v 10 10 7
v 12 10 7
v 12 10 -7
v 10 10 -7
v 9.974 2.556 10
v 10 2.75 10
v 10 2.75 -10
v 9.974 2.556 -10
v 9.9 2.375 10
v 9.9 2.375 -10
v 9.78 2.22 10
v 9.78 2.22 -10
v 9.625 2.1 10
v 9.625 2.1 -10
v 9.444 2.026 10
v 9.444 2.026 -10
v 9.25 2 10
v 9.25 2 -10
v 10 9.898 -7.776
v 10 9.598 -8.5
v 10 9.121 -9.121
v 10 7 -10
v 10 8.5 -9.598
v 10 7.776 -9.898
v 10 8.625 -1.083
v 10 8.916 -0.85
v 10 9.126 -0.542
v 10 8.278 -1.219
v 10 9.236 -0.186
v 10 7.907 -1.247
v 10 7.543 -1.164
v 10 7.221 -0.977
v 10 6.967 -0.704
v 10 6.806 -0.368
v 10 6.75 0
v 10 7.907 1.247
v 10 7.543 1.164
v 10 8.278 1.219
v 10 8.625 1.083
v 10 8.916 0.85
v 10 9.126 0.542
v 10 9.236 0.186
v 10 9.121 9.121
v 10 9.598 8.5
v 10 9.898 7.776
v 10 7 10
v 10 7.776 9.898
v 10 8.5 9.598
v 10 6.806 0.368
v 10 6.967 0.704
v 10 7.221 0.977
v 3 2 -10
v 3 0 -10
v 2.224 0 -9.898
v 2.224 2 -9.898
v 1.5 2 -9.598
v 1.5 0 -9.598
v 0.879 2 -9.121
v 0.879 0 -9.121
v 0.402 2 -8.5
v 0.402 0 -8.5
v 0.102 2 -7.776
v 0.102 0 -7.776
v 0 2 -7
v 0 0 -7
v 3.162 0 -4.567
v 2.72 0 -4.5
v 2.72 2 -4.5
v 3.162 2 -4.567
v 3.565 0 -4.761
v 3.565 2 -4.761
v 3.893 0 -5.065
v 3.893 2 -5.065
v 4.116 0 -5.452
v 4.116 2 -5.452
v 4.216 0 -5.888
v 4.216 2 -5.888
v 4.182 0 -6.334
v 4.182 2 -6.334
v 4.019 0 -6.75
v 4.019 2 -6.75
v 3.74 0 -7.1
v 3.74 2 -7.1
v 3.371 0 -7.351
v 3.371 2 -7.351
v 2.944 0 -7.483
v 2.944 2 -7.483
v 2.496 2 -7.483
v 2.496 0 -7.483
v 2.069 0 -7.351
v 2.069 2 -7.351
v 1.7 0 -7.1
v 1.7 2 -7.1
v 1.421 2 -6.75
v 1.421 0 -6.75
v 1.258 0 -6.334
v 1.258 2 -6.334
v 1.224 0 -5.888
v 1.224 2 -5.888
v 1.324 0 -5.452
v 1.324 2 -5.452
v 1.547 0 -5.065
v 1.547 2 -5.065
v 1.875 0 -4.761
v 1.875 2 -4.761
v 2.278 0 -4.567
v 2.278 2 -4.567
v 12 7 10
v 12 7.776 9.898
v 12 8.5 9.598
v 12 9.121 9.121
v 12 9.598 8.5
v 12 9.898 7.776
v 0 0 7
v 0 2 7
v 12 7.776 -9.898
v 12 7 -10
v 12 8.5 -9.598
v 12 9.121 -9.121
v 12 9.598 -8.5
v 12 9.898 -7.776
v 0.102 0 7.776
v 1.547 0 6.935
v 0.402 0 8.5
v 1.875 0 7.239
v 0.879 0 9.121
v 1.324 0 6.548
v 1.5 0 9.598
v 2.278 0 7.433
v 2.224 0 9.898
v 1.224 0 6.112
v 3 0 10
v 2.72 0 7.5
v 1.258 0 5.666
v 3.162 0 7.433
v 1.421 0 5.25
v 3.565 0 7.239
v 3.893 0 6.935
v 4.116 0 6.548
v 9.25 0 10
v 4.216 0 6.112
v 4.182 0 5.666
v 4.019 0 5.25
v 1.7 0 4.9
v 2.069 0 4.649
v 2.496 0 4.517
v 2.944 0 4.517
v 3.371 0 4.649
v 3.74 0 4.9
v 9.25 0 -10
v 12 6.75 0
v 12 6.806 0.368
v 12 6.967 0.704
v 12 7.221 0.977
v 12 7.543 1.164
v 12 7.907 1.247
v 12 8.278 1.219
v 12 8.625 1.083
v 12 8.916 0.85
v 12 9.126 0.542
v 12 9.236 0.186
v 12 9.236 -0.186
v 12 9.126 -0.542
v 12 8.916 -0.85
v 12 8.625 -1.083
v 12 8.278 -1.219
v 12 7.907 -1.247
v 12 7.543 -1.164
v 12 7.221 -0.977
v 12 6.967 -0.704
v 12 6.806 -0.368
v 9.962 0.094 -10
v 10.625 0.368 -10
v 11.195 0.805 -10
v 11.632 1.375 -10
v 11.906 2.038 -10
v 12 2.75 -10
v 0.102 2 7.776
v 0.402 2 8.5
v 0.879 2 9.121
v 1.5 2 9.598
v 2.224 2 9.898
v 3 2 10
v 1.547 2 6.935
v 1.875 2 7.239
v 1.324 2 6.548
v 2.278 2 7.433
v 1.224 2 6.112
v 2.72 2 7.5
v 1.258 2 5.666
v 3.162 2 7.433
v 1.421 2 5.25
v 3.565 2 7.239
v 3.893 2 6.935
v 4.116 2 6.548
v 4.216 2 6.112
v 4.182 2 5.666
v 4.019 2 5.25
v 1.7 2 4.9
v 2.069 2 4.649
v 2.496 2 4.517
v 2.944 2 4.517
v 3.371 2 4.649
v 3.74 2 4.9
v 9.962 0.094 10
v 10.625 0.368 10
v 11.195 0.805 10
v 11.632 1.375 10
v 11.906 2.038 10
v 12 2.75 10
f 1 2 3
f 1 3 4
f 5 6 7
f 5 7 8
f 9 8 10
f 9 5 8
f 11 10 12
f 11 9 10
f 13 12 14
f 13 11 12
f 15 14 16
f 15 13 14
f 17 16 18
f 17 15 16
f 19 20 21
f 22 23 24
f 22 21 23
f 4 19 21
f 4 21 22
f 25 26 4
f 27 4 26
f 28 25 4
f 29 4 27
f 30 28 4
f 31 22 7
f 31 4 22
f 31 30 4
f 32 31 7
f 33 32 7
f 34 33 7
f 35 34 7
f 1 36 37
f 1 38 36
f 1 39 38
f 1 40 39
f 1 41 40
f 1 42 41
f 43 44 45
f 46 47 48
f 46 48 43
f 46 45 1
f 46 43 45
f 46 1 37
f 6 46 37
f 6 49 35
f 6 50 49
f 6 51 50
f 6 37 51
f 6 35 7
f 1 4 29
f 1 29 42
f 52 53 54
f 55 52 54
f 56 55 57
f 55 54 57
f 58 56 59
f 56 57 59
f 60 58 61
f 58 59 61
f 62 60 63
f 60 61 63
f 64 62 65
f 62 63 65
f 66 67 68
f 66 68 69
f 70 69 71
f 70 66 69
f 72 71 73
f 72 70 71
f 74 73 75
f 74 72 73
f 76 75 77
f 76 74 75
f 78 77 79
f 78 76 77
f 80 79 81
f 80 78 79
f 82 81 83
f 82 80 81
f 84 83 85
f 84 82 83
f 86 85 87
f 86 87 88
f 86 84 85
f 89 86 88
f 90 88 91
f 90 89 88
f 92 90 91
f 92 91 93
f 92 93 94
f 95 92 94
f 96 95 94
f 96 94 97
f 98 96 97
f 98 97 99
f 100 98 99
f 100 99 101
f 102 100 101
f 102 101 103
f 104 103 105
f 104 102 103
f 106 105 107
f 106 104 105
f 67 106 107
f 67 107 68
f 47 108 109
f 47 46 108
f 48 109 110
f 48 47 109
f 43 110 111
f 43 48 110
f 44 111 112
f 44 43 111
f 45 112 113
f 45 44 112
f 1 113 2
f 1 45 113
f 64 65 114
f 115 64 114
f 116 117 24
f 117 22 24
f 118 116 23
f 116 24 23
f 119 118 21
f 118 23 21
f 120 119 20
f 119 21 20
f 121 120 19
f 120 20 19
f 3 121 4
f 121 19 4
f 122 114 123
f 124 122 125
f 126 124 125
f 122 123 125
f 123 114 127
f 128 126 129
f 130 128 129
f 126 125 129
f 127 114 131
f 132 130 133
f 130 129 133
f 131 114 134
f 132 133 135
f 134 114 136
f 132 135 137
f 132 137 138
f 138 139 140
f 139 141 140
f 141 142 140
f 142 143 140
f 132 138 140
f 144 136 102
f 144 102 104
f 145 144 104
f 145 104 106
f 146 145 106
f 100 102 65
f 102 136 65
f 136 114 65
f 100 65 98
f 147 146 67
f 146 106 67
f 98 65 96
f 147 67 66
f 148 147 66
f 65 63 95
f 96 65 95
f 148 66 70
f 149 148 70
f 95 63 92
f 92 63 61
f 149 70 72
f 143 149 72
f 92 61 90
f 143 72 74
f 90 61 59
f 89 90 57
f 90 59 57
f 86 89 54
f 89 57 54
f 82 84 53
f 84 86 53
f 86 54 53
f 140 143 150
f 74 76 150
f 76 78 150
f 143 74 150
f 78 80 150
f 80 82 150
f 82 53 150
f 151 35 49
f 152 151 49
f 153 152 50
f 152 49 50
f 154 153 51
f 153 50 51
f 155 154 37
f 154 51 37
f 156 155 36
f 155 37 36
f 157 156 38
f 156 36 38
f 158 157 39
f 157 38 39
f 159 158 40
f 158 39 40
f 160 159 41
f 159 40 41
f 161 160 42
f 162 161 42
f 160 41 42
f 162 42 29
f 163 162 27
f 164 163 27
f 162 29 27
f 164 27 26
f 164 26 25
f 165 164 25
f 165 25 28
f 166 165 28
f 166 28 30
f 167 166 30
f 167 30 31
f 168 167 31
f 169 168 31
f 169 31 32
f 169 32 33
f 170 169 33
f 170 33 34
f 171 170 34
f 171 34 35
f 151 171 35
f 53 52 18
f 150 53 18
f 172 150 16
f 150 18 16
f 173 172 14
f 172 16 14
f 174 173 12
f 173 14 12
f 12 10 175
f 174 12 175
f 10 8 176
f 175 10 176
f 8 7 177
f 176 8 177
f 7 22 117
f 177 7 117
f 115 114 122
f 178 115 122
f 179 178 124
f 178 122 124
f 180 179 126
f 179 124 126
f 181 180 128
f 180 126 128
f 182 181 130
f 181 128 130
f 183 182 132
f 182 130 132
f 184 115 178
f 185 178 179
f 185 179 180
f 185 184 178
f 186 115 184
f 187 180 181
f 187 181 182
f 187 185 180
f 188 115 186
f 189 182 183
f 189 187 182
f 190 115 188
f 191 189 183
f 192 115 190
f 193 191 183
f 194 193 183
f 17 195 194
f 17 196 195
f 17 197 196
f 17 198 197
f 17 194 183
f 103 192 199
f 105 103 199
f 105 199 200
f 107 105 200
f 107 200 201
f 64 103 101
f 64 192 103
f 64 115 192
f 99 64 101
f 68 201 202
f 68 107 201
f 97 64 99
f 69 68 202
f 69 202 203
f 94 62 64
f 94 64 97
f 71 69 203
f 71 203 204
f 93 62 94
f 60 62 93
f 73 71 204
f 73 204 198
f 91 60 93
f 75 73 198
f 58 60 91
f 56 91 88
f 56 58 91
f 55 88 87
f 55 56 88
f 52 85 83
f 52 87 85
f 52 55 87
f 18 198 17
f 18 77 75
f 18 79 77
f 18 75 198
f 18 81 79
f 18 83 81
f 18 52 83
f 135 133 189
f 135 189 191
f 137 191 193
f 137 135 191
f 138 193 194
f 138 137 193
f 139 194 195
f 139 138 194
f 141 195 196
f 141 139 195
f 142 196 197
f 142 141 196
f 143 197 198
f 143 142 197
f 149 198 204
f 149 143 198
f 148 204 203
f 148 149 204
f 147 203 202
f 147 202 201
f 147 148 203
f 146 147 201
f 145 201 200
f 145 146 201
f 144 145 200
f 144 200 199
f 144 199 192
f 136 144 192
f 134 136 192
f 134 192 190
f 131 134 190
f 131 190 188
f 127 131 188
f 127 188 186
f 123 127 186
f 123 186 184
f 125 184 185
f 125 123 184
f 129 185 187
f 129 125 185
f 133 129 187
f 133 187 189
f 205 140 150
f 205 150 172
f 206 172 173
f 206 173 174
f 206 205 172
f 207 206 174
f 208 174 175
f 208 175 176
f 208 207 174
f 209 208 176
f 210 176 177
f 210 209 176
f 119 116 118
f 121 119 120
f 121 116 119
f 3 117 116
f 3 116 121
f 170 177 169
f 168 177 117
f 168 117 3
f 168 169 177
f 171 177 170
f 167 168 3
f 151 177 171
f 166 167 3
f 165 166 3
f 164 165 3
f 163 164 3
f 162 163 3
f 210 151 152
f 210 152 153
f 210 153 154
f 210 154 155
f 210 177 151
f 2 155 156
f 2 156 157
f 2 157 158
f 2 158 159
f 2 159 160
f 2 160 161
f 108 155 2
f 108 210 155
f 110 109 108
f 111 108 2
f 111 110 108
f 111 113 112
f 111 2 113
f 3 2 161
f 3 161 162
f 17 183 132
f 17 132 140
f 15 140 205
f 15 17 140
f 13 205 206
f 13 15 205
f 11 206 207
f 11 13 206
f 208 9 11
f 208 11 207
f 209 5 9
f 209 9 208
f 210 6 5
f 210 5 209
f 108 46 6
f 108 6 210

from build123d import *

# Parameters (mm, degrees)
SKETCH1_R                    = 1.5
BASE_FLANGE1_DEPTH           = 2
EDGE_FLANGE1_STRIP_W         = 9.5
EDGE_FLANGE1_STRIP_H         = 2
EDGE_FLANGE1_STRIP_CUT_DEPTH = 20
EDGE_FLANGE1_DEPTH           = 20
SKETCH9_R                    = 1.25
CUT_EXTRUDE1_DEPTH           = 10
FILLET1_R                    = 3


# Sheet-metal steps are written as plain solids
with BuildPart() as part:
    # Sketch1 → Base-Flange1 (new body)
    with BuildSketch(Plane(origin=(0, 0, 0), x_dir=(1, 0, 0), z_dir=(0, 1, 0))):
        with BuildLine():
            Line((0, 7), (0, -7))
            ThreePointArc((0, -7), (0.878679656, -9.121320344), (3, -10))
            Line((3, -10), (12, -10))
            Line((12, -10), (12, 10))
            Line((12, 10), (3, 10))
            ThreePointArc((3, 10), (0.878679656, 9.121320344), (0, 7))
        make_face()
        with Locations(Location((2.72, 6, 0), (0, 0, 270))):
            Circle(SKETCH1_R, mode=Mode.SUBTRACT)
        with Locations(Location((2.72, -6, 0), (0, 0, 270))):
            Circle(SKETCH1_R, mode=Mode.SUBTRACT)
    extrude(amount=BASE_FLANGE1_DEPTH)

    # Edge-Flange1 strip (across the edge) → Edge-Flange1 strip cut (cut)
    with BuildSketch(Plane(origin=(12, 2, 10), x_dir=(-1, 0, 0), z_dir=(0, 0, -1))):
        with Locations((-2, -1)):
            Rectangle(EDGE_FLANGE1_STRIP_W, EDGE_FLANGE1_STRIP_H)
    extrude(amount=EDGE_FLANGE1_STRIP_CUT_DEPTH, mode=Mode.SUBTRACT)

    # Edge-Flange1 section (across the edge) → Edge-Flange1 (add)
    with BuildSketch(Plane(origin=(12, 2, 10), x_dir=(-1, 0, 0), z_dir=(0, 0, -1))):
        with BuildLine():
            Line((0, 0.75), (0, 8))
            Line((0, 8), (2, 8))
            Line((2, 8), (2, 0.75))
            ThreePointArc((2, 0.75), (2.219669914, 0.219669914), (2.75, 0))
            Line((2.75, 0), (2.75, -2))
            ThreePointArc((2.75, -2), (0.805456352, -1.194543648), (0, 0.75))
        make_face()
    extrude(amount=EDGE_FLANGE1_DEPTH)

    # Sketch9 → Cut-Extrude1 (cut)
    with BuildSketch(Plane.ZY.offset(-10)):
        with Locations(Location((0, 8, 0), (0, 0, 270))):
            Circle(SKETCH9_R)
    extrude(amount=-CUT_EXTRUDE1_DEPTH, mode=Mode.SUBTRACT)

    # Fillet1
    fillet1_edges = [part.edges().sort_by_distance(p)[0] for p in [
        (11, 10, 10),
        (11, 10, -10),
    ]]
    fillet(fillet1_edges, radius=FILLET1_R)


solid = part.part
